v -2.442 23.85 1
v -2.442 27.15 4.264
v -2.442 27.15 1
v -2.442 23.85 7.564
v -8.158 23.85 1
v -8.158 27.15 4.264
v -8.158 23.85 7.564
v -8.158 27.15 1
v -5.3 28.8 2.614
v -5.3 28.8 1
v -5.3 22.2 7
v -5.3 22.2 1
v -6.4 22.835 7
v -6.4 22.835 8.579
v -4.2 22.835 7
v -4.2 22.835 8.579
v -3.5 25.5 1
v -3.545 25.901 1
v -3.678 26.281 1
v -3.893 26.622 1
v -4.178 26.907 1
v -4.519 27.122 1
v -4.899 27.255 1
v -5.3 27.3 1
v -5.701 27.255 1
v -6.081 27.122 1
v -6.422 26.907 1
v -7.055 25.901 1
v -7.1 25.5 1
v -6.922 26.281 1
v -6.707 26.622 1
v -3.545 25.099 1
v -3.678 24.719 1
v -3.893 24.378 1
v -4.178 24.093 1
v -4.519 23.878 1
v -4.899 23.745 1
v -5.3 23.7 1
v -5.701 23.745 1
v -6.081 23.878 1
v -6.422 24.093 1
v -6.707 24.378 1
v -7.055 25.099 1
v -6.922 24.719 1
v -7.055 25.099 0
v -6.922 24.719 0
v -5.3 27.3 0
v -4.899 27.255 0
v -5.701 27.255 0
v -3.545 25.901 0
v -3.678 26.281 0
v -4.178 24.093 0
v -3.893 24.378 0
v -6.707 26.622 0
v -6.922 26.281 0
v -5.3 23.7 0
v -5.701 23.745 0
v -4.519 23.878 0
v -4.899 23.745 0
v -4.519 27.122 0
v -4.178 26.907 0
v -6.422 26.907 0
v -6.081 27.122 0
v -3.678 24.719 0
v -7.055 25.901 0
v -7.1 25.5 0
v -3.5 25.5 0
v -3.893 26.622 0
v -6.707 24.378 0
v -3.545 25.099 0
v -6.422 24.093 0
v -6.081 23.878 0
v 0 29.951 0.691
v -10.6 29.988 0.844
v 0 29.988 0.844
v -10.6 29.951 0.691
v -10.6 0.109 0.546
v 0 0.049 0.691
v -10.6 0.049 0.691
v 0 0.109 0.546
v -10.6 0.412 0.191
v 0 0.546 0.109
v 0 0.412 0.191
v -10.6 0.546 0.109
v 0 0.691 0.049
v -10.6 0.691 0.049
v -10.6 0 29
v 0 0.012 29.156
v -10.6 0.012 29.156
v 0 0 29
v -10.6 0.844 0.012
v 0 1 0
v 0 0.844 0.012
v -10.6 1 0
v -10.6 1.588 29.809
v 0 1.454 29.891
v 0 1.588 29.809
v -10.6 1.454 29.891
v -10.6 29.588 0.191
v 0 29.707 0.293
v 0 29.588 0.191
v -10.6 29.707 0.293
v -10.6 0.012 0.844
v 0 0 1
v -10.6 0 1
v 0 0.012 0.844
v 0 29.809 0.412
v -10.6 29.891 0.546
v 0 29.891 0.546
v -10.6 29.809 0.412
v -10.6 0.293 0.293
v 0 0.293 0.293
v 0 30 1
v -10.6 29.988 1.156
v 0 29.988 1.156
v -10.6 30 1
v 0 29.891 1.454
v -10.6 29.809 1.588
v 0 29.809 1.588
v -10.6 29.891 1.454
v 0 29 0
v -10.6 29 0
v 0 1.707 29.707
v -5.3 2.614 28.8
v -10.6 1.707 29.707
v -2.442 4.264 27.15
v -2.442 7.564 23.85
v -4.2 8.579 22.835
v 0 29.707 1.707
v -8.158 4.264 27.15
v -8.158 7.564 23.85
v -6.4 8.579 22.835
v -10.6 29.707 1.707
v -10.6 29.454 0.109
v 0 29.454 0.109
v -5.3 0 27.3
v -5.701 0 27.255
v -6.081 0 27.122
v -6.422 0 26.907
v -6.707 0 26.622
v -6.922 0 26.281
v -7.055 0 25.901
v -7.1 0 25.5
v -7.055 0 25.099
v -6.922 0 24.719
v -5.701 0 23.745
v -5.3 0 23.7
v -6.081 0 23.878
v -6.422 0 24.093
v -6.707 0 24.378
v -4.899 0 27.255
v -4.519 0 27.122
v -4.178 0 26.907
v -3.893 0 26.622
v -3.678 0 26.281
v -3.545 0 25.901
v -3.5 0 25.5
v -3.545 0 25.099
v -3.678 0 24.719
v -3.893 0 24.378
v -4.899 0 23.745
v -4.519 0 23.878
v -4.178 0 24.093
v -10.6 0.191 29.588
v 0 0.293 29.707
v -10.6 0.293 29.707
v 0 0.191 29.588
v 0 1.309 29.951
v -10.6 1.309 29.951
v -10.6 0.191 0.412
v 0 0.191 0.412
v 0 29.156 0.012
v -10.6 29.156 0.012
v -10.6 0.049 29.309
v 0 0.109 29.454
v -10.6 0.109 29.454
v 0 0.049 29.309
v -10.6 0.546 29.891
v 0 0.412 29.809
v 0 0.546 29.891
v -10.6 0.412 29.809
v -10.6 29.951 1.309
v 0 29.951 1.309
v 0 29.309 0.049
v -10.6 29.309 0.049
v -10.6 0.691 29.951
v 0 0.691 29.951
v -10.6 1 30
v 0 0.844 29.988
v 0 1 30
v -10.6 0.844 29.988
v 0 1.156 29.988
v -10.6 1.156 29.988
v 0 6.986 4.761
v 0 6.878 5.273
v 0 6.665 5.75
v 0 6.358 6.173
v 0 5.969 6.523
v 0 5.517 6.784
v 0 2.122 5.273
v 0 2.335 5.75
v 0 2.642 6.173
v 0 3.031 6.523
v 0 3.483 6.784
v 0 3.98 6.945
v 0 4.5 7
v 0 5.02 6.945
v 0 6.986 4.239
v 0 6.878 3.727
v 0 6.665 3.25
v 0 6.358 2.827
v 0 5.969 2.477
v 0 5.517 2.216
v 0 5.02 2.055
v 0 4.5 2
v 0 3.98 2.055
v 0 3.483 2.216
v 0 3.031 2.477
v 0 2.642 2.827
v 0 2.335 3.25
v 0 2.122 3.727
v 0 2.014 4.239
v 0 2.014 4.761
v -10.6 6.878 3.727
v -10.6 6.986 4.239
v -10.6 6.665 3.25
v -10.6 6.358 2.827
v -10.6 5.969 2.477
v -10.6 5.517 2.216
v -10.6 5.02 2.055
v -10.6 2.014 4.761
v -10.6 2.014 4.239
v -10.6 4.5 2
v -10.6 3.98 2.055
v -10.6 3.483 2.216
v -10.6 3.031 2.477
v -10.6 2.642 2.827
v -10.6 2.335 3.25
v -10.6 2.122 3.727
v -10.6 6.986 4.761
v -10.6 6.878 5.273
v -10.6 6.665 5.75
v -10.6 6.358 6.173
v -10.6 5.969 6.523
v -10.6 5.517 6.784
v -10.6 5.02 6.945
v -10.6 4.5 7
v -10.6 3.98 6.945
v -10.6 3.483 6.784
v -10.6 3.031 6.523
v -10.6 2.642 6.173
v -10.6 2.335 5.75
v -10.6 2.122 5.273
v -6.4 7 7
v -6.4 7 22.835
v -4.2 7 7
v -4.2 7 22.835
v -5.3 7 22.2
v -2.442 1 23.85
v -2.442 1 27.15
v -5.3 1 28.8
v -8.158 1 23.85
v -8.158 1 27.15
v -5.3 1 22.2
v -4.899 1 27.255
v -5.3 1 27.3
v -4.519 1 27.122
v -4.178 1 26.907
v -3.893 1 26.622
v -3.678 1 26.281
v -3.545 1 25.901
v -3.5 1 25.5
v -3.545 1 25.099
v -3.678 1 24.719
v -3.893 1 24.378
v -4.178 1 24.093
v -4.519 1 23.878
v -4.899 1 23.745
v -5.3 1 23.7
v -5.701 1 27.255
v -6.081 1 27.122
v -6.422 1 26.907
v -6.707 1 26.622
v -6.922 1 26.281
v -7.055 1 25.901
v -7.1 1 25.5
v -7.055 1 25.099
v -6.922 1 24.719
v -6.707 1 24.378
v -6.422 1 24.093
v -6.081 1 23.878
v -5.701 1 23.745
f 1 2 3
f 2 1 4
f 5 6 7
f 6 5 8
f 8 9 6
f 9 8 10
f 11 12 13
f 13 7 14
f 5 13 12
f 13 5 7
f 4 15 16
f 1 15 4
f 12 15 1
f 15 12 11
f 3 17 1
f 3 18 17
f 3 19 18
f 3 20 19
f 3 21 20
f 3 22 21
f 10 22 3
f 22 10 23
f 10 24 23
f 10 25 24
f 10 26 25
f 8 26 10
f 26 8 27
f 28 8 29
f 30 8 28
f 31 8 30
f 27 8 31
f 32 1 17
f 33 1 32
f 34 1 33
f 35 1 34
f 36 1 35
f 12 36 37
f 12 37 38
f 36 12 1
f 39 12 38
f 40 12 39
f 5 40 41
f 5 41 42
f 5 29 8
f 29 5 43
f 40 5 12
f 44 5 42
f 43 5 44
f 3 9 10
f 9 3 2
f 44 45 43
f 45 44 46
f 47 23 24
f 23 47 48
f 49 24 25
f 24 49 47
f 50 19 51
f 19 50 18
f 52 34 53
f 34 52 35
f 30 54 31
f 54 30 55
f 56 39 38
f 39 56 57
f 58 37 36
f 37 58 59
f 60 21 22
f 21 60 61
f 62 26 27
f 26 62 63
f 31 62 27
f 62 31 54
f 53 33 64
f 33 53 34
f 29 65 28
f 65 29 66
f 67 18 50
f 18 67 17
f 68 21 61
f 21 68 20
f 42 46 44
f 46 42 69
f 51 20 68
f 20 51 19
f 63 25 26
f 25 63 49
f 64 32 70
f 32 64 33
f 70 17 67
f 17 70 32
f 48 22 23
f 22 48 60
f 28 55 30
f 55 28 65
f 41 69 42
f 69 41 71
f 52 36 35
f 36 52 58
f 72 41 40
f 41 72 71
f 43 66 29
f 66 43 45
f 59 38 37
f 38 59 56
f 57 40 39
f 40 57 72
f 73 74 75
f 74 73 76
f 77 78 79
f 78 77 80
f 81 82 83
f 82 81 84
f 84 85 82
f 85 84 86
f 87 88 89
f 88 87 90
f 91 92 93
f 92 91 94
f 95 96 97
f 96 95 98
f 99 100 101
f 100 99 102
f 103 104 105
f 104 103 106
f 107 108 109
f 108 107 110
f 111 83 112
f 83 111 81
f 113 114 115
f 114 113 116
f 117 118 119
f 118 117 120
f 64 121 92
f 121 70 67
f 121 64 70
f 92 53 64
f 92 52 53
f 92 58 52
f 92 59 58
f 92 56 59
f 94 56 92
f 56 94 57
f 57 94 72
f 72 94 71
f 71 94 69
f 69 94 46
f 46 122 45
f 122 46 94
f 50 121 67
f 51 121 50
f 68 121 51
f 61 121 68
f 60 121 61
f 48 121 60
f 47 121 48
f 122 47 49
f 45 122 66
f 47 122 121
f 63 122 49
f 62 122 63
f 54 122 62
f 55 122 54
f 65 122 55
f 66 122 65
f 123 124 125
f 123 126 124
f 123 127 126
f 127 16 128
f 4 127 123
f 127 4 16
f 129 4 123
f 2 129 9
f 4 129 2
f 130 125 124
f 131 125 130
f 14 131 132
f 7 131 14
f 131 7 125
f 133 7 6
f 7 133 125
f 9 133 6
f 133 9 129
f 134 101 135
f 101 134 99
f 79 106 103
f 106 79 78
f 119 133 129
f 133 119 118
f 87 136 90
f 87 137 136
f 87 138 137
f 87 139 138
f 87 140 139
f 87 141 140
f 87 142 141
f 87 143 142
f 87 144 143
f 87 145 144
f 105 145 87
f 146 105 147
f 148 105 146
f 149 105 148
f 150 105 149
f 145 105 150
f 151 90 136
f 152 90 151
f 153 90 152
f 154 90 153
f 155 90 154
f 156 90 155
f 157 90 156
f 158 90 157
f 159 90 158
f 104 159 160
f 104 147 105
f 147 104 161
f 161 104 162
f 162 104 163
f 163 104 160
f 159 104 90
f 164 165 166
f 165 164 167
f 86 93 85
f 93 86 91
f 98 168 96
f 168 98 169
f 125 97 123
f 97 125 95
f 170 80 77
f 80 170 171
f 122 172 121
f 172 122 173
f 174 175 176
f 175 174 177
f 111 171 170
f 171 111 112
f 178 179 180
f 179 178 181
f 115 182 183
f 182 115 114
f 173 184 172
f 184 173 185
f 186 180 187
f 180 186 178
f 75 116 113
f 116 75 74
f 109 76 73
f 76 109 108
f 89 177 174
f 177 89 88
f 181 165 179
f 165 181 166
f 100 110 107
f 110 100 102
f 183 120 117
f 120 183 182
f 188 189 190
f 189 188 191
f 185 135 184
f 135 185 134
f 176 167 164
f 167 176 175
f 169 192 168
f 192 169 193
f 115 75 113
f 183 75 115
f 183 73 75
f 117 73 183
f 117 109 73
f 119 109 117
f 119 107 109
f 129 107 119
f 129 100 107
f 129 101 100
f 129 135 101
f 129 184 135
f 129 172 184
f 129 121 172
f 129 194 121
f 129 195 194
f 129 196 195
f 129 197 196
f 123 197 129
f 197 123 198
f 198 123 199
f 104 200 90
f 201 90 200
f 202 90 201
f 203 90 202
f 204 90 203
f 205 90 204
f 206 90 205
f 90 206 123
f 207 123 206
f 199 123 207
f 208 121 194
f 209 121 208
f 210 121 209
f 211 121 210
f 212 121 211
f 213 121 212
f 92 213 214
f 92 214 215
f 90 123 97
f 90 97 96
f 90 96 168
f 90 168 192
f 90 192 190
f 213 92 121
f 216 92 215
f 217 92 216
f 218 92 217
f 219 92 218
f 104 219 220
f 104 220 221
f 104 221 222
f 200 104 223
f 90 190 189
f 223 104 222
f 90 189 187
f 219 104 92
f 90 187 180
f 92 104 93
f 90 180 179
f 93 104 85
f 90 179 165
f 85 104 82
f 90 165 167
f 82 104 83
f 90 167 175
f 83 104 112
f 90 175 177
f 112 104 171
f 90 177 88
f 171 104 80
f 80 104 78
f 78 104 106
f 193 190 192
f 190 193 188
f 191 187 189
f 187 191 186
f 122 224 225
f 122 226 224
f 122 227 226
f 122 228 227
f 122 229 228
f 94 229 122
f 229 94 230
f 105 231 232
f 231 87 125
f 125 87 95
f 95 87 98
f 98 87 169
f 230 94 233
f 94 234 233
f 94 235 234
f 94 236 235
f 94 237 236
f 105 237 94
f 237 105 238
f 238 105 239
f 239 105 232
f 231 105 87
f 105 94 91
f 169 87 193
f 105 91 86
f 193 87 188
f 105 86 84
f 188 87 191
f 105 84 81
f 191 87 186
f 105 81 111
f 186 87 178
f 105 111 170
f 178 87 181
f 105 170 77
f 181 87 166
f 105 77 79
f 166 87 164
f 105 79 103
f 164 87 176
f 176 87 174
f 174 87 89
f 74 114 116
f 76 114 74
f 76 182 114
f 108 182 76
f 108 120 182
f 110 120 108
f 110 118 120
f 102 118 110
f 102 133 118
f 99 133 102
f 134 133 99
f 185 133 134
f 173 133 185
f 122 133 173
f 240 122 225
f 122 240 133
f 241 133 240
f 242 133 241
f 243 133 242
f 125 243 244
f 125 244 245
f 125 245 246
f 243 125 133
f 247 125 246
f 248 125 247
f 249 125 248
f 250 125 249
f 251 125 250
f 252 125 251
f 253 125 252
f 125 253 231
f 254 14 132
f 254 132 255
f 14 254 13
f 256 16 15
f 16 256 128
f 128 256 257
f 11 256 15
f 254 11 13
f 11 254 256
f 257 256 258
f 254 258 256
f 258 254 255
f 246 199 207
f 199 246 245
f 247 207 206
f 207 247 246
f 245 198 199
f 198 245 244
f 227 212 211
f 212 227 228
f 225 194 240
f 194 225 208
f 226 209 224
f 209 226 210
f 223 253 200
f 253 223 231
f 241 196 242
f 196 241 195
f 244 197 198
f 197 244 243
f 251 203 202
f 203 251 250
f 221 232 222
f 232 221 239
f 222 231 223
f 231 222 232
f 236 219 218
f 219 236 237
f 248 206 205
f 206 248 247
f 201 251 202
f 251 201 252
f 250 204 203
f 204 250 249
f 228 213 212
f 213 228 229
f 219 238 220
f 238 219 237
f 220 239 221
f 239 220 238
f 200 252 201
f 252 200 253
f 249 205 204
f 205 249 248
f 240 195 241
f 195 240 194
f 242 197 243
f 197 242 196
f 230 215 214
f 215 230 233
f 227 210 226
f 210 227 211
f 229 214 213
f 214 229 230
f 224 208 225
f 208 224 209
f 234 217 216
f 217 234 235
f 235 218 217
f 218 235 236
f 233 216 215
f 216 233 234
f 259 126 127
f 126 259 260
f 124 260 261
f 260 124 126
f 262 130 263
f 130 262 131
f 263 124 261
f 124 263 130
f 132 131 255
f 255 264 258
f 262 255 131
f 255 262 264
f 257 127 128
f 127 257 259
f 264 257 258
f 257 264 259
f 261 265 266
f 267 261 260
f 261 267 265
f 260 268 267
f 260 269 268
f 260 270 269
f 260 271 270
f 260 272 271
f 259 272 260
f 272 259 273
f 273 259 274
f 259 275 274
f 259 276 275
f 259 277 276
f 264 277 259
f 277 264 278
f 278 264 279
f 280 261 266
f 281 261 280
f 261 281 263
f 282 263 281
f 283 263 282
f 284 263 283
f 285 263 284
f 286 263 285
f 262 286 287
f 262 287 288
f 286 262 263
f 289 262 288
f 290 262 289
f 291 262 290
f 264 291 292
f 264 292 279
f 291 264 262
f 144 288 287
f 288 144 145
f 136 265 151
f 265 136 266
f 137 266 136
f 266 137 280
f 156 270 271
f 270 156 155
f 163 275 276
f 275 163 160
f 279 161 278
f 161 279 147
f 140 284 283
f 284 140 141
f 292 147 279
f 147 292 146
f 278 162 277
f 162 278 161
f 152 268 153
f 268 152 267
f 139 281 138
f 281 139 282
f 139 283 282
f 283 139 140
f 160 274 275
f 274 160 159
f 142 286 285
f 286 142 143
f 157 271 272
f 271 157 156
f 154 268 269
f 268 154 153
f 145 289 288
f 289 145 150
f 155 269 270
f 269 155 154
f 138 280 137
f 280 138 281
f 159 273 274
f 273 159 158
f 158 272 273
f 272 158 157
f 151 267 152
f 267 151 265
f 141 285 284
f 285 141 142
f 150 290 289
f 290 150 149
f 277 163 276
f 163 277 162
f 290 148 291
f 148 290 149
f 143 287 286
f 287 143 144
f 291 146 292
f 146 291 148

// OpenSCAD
/* [Global] */
holdertype = "corner"; // [corner,side]

//The thickness of the glass
glass_thickness = 2.2;

//The width of the clamp
width = 30; 

//The size of the skrew
mountingholde = 5; 

// Nutsize of the glassplate thightner
nutsize = 6.6; 

//The size of the bolt
bolt_size = 3.6; 

//Wallthickess at the side of the glass
wallthickness = 2; 

/* [side holder] */
//Depth into the glassplate (Only for side holdertype)
dept = 15; 

/* [Hidden] */
totalthickness = glass_thickness + (2*wallthickness) < nutsize + (2*wallthickness) ? nutsize + (2*wallthickness) : glass_thickness + wallthickness;
actual_wallthickness = (totalthickness - glass_thickness) / 2;

module corner()
{
    rotate([0,-90,0])
    difference()
    {
        hull()
        {
            translate([width-1,1,0])
            cylinder(r=1,h=totalthickness,$fn=40);

            translate([1,1,0])
            cylinder(r=1,h=totalthickness,$fn=40);

            translate([1,width-1,0])
            cylinder(r=1,h=totalthickness,$fn=40);
        }
        
        translate([2+mountingholde,2+mountingholde,actual_wallthickness])
        cube([width,width,glass_thickness]);
        
        translate([2+mountingholde/2,2+mountingholde/2,-1])
        cylinder(r=mountingholde/2,h=20,$fn=30);

        translate([width-(2+mountingholde/2),width + 1,(totalthickness)/2])
        rotate([90,0,0])
        cylinder(r=nutsize/2,h=width,$fn=6);

        translate([width-(2+mountingholde/2),width/2,(totalthickness)/2])
        rotate([90,0,0])
        cylinder(r=bolt_size/2,h=width,$fn=28);


        mirror([1,0,0])
        rotate([0,0,90])
        {
            translate([width-(2+mountingholde/2),width + 1,(totalthickness)/2])
            rotate([90,0,0])
            cylinder(r=nutsize/2,h=width,$fn=6);

            translate([width-(2+mountingholde/2),width/2,(totalthickness)/2])
            rotate([90,0,0])
            cylinder(r=bolt_size/2,h=width,$fn=28);
        }
    }
}

module side()
{
    rotate([90,0,0])
    difference()
    {
        hull()
        {
            translate([width-1,1,0])
            cylinder(r=1,h=totalthickness,$fn=40);

            translate([width-1,dept-1,0])
            cylinder(r=1,h=totalthickness,$fn=40);

            translate([1,1,0])
            cylinder(r=1,h=totalthickness,$fn=40);

            translate([1,dept-1,0])
            cylinder(r=1,h=totalthickness,$fn=40);
        }
        
        translate([-0.1,2+mountingholde,actual_wallthickness])
        cube([width+1,width,glass_thickness]);
        
        translate([width/2,2+mountingholde/2,-1])
        cylinder(r=mountingholde/2,h=20,$fn=30);

        {
            translate([width-(2+mountingholde/2),width + 1,(totalthickness)/2])
            rotate([90,0,0])
            cylinder(r=nutsize/2,h=width,$fn=6);

            translate([width-(2+mountingholde/2),width/2,(totalthickness)/2])
            rotate([90,0,0])
            cylinder(r=bolt_size/2,h=width,$fn=28);
        }

        {
            translate([(2+mountingholde/2),width + 1,(totalthickness)/2])
            rotate([90,0,0])
            cylinder(r=nutsize/2,h=width,$fn=6);

            translate([(2+mountingholde/2),width/2,(totalthickness)/2])
            rotate([90,0,0])
            cylinder(r=bolt_size/2,h=width,$fn=28);
        }
    }
}

if(holdertype == "side")
{
    side();
}

if(holdertype == "corner")
{
    corner();
}
